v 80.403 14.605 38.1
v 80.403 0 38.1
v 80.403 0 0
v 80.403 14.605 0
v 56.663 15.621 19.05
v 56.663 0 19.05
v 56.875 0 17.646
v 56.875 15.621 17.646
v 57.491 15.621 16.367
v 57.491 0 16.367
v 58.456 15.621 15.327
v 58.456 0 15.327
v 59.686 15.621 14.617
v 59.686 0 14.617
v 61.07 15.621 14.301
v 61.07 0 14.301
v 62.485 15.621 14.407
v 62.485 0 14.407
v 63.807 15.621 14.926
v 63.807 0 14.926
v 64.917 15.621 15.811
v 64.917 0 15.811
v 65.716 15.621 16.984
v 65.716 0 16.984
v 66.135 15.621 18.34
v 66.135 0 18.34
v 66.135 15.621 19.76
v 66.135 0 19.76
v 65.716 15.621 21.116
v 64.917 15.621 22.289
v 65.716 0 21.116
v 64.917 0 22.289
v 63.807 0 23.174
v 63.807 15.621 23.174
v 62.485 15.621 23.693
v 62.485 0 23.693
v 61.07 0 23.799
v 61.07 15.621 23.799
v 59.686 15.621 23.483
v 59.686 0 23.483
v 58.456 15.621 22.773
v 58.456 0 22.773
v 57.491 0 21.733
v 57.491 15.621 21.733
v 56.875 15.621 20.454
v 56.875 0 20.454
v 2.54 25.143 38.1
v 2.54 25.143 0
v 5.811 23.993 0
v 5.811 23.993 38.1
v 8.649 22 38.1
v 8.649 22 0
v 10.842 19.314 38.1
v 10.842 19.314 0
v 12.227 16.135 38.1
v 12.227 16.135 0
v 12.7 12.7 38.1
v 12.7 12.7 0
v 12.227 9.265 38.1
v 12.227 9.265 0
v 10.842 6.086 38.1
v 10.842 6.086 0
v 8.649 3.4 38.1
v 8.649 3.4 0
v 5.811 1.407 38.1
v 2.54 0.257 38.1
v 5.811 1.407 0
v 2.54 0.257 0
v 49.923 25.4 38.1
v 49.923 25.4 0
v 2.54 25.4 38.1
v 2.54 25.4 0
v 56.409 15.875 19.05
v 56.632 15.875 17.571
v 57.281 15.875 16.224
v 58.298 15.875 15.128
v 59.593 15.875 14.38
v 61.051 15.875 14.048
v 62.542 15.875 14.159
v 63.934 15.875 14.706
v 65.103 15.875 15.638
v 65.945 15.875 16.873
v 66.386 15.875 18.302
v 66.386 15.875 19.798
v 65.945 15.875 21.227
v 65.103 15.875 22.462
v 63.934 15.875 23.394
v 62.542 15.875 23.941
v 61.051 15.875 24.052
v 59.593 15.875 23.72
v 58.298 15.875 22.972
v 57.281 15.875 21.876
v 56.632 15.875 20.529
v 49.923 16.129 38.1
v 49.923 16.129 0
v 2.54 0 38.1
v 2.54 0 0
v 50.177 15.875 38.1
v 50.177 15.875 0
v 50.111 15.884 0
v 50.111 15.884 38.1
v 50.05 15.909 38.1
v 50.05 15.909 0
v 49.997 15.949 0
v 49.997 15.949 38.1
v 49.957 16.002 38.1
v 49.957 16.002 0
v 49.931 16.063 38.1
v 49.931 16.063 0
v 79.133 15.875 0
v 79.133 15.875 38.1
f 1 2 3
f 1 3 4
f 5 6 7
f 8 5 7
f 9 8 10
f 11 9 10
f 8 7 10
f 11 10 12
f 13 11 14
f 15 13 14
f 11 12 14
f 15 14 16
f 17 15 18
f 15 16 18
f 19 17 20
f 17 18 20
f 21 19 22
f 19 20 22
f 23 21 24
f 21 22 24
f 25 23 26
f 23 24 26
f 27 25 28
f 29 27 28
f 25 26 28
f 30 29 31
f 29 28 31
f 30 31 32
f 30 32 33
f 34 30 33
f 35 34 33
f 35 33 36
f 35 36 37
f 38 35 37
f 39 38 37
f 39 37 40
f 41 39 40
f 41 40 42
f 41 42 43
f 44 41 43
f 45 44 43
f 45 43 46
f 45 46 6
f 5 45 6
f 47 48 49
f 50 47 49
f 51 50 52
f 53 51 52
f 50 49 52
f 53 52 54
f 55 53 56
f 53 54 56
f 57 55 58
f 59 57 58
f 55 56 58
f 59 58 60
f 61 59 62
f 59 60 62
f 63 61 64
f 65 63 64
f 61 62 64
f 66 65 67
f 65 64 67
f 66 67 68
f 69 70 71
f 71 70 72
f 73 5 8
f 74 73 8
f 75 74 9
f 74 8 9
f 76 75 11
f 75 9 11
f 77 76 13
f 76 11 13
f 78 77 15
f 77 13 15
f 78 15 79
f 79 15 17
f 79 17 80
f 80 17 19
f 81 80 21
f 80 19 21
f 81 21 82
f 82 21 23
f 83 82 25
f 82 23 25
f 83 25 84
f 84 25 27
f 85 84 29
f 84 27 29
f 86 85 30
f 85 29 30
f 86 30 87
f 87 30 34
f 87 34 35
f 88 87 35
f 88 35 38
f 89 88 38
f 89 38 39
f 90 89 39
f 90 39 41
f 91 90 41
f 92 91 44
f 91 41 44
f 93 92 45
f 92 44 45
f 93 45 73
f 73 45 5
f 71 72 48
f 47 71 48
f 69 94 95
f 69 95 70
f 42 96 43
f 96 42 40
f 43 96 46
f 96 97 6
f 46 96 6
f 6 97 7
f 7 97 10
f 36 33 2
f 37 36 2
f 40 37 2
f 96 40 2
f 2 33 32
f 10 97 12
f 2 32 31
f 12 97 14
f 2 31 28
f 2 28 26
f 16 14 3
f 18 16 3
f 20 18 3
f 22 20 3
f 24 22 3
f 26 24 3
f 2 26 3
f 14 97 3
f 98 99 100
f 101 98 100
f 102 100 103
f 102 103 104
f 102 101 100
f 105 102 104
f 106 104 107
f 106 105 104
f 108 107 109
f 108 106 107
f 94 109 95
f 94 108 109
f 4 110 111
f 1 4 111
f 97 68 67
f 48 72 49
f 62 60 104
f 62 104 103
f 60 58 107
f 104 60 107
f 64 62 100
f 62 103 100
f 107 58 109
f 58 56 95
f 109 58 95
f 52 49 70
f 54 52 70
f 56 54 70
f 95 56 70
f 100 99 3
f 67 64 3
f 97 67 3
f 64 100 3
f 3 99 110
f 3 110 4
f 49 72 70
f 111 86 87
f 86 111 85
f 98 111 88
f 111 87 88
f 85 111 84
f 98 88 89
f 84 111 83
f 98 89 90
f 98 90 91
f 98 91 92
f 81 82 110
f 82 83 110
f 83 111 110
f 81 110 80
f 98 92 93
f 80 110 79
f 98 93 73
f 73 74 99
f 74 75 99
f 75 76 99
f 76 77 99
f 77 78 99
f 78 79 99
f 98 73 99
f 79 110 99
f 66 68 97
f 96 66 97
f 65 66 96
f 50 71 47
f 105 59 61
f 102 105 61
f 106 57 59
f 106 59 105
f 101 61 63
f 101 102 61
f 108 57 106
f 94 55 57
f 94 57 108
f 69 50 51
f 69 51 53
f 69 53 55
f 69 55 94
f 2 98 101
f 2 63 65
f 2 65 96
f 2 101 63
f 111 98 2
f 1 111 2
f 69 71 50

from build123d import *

# Parameters (mm, degrees)
BOSS_EXTRUDE1_DEPTH          = 38.1
F_3_8_0_375_DIAMETER_HOLE1_D = 9.525
CHAMFER1_SIZE                = 1.27
CHAMFER2_SIZE                = 0.254
FILLET1_R                    = 0.254


with BuildPart() as part:
    # Sketch1 → Boss-Extrude1 (new body)
    with BuildSketch(Plane.XY):
        with BuildLine():
            Line((2.54, 0), (80.402581892, 0))
            Line((80.402581892, 0), (80.402581892, 15.875))
            Line((80.402581892, 15.875), (49.922581892, 15.875))
            Line((49.922581892, 15.875), (49.922581892, 25.4))
            Line((49.922581892, 25.4), (2.54, 25.4))
            Line((2.54, 25.4), (2.54, 25.143407893))
            ThreePointArc((2.54, 25.143407893), (12.7, 12.7), (2.54, 0.256592107))
            Line((2.54, 0.256592107), (2.54, 0))
        make_face()
    extrude(amount=BOSS_EXTRUDE1_DEPTH)

    # 3/8 (0.375) Diameter Hole1 (through all)
    with Locations(Plane(origin=(0, 15.875, 0), x_dir=(1, 0, 0), z_dir=(0, 1, 0))):
        with Locations((61.425582, -19.05)):
            Hole(F_3_8_0_375_DIAMETER_HOLE1_D / 2)

    # Chamfer1
    chamfer1_edges = [part.edges().sort_by_distance(p)[0] for p in [
        (80.402581892, 15.875, 19.05),
    ]]
    chamfer(chamfer1_edges, length=CHAMFER1_SIZE)

    # Chamfer2
    chamfer2_edges = [part.edges().sort_by_distance(p)[0] for p in [
        (66.188082, 15.875, 19.05),
    ]]
    chamfer(chamfer2_edges, length=CHAMFER2_SIZE)

    # Fillet1
    fillet1_edges = [part.edges().sort_by_distance(p)[0] for p in [
        (49.922581892, 15.875, 19.05),
    ]]
    fillet(fillet1_edges, radius=FILLET1_R)


solid = part.part
